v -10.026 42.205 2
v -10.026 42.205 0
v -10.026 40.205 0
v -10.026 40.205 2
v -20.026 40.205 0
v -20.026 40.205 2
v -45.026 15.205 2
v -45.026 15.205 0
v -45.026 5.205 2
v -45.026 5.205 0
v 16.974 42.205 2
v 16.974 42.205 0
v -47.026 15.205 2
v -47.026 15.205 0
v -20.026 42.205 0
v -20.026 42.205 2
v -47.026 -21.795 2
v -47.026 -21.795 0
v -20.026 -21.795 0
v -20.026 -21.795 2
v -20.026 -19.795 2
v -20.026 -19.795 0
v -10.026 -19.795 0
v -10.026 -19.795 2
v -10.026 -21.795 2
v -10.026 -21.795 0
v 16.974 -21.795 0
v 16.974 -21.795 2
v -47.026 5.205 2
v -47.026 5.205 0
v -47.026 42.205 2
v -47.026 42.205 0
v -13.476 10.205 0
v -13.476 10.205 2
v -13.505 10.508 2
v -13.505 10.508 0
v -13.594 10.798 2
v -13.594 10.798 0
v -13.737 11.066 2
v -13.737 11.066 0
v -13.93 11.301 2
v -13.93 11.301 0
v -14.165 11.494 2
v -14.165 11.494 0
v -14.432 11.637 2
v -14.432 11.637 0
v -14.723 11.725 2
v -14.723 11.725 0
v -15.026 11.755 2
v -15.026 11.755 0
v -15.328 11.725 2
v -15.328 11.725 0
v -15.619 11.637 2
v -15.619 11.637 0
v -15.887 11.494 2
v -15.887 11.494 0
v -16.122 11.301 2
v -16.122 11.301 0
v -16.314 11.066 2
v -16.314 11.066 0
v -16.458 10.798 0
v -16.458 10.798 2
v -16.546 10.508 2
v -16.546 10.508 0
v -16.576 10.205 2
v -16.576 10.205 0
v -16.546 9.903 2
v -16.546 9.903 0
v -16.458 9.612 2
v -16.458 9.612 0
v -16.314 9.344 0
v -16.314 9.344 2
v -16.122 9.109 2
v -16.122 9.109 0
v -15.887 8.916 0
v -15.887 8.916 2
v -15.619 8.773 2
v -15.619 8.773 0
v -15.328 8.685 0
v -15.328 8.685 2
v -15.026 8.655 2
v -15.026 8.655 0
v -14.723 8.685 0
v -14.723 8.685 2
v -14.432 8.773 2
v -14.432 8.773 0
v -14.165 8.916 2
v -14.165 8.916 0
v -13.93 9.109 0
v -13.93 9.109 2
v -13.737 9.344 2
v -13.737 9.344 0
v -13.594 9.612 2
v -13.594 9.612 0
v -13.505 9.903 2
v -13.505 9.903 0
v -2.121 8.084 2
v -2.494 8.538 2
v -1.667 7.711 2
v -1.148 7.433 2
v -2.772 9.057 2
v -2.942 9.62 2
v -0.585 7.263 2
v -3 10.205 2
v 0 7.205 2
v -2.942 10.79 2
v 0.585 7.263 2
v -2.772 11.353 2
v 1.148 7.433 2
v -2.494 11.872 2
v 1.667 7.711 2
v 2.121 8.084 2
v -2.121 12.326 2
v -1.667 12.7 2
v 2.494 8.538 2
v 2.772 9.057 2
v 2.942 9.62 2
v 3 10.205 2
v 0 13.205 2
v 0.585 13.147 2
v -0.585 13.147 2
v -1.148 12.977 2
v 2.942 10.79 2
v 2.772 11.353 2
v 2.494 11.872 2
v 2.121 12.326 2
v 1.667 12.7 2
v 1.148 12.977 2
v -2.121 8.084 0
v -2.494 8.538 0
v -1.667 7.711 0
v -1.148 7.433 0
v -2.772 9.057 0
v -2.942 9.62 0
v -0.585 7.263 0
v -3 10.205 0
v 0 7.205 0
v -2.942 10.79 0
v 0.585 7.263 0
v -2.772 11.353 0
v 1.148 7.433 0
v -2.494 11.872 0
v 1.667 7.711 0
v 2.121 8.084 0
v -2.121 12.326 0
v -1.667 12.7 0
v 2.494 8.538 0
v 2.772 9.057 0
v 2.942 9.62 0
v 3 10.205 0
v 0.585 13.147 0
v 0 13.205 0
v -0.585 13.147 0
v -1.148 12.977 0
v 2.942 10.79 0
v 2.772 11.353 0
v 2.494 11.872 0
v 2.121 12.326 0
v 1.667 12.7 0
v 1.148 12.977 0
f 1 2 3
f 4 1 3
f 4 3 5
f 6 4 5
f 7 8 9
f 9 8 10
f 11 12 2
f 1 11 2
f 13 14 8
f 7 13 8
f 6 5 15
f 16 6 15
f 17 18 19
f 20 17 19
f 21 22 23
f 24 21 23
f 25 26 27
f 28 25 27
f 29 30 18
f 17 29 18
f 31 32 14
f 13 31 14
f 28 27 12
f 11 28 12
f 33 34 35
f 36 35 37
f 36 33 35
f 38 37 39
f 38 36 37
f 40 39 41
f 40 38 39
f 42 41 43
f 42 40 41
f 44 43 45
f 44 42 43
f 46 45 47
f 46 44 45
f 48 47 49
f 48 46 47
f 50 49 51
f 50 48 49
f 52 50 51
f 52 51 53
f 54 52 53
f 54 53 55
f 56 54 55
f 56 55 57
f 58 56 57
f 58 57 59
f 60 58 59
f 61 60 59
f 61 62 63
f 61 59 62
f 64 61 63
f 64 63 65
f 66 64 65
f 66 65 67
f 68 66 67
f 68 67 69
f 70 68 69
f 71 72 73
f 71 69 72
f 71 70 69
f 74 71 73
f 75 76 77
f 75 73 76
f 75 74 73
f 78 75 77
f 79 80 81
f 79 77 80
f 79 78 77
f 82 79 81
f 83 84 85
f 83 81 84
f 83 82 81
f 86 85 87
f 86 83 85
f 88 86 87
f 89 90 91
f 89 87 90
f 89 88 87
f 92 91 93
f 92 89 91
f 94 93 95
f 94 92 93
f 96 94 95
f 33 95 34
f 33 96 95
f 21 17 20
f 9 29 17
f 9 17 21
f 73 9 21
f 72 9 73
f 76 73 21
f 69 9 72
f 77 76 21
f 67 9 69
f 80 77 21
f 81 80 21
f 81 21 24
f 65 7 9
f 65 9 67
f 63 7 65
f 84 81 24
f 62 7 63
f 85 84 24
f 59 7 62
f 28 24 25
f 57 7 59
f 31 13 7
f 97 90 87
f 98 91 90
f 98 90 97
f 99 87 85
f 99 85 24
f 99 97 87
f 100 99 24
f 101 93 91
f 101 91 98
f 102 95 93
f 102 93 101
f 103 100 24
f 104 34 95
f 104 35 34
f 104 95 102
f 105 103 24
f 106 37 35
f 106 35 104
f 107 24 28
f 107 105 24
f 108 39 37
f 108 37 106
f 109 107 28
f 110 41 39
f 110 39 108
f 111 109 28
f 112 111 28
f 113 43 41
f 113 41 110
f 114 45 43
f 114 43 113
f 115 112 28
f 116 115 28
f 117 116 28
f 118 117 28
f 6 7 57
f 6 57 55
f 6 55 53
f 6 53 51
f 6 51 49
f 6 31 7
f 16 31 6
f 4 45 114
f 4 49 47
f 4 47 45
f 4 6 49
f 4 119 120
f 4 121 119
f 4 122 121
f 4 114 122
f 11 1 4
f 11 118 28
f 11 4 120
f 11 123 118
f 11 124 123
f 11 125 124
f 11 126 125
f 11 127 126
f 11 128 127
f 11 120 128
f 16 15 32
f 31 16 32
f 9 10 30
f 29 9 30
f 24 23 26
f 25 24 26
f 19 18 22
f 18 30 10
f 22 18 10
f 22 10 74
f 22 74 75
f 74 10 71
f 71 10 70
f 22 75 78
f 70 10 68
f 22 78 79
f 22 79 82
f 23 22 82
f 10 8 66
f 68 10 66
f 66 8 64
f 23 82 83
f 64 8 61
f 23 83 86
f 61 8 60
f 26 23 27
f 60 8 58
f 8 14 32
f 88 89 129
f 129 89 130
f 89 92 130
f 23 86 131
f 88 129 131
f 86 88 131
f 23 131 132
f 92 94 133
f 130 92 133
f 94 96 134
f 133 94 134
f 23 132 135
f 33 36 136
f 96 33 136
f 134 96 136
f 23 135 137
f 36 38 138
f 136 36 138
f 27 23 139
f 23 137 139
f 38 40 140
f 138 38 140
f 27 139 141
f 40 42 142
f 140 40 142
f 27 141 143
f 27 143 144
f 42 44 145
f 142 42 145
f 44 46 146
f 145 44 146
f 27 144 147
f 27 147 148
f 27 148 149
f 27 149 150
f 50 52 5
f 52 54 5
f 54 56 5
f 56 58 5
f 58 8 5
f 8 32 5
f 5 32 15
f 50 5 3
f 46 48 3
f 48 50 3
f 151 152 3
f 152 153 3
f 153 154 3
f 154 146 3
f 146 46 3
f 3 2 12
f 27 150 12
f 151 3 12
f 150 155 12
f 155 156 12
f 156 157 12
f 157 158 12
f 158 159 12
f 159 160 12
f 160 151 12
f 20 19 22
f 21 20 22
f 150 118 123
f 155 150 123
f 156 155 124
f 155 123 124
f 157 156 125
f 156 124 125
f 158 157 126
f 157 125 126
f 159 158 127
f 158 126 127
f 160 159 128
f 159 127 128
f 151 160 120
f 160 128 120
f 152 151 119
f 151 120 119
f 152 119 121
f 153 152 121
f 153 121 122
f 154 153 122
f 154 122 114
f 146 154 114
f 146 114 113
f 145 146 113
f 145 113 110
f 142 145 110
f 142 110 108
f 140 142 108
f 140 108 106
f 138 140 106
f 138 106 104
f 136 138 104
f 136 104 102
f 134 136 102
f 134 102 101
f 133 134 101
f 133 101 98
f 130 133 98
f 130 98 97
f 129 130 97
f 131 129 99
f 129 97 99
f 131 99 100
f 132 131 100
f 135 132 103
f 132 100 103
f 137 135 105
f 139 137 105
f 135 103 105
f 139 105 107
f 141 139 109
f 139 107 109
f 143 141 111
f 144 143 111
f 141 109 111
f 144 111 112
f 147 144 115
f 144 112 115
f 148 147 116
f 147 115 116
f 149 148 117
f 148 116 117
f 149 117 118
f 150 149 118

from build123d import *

# Parameters (mm, degrees)
EXTRUDE_1_DEPTH     = 2
SKETCH_2_R          = 1.55
CUT_EXTRUDE_1_DEPTH = 5
SKETCH_3_R          = 3
CUT_EXTRUDE_2_DEPTH = 10


with BuildPart() as part:
    # 草图1 → 凸台-拉伸1 (new body)
    with BuildSketch(Plane.XY):
        Polygon((16.974358974, 15.205128205), (16.974358974, 42.205128205), (2.974358974, 42.205128205), (-5.298152288, 42.205128205), (-10.025641026, 42.205128205), (-10.025641026, 40.205128205), (-20.025641026, 40.205128205), (-20.025641026, 42.205128205), (-47.025641026, 42.205128205), (-47.025641026, 15.205128205), (-45.025641026, 15.205128205), (-45.025641026, 5.205128205), (-47.025641026, 5.205128205), (-47.025641026, -21.794871795), (-20.025641026, -21.794871795), (-20.025641026, -19.794871795), (-10.025641026, -19.794871795), (-10.025641026, -21.794871795), (16.974358974, -21.794871795), (16.974358974, 5.205128205), align=None)
    extrude(amount=EXTRUDE_1_DEPTH)

    # 草图2 → 切除-拉伸1 (cut)
    with BuildSketch(Plane.XY):
        with Locations((-15.025641026, 10.205128205)):
            Circle(SKETCH_2_R)
    extrude(amount=CUT_EXTRUDE_1_DEPTH, mode=Mode.SUBTRACT)

    # 草图3 → 切除-拉伸2 (cut)
    with BuildSketch(Plane.XY.offset(2)):
        with Locations((0, 10.205128205)):
            Circle(SKETCH_3_R)
    extrude(amount=-CUT_EXTRUDE_2_DEPTH, mode=Mode.SUBTRACT)


solid = part.part
